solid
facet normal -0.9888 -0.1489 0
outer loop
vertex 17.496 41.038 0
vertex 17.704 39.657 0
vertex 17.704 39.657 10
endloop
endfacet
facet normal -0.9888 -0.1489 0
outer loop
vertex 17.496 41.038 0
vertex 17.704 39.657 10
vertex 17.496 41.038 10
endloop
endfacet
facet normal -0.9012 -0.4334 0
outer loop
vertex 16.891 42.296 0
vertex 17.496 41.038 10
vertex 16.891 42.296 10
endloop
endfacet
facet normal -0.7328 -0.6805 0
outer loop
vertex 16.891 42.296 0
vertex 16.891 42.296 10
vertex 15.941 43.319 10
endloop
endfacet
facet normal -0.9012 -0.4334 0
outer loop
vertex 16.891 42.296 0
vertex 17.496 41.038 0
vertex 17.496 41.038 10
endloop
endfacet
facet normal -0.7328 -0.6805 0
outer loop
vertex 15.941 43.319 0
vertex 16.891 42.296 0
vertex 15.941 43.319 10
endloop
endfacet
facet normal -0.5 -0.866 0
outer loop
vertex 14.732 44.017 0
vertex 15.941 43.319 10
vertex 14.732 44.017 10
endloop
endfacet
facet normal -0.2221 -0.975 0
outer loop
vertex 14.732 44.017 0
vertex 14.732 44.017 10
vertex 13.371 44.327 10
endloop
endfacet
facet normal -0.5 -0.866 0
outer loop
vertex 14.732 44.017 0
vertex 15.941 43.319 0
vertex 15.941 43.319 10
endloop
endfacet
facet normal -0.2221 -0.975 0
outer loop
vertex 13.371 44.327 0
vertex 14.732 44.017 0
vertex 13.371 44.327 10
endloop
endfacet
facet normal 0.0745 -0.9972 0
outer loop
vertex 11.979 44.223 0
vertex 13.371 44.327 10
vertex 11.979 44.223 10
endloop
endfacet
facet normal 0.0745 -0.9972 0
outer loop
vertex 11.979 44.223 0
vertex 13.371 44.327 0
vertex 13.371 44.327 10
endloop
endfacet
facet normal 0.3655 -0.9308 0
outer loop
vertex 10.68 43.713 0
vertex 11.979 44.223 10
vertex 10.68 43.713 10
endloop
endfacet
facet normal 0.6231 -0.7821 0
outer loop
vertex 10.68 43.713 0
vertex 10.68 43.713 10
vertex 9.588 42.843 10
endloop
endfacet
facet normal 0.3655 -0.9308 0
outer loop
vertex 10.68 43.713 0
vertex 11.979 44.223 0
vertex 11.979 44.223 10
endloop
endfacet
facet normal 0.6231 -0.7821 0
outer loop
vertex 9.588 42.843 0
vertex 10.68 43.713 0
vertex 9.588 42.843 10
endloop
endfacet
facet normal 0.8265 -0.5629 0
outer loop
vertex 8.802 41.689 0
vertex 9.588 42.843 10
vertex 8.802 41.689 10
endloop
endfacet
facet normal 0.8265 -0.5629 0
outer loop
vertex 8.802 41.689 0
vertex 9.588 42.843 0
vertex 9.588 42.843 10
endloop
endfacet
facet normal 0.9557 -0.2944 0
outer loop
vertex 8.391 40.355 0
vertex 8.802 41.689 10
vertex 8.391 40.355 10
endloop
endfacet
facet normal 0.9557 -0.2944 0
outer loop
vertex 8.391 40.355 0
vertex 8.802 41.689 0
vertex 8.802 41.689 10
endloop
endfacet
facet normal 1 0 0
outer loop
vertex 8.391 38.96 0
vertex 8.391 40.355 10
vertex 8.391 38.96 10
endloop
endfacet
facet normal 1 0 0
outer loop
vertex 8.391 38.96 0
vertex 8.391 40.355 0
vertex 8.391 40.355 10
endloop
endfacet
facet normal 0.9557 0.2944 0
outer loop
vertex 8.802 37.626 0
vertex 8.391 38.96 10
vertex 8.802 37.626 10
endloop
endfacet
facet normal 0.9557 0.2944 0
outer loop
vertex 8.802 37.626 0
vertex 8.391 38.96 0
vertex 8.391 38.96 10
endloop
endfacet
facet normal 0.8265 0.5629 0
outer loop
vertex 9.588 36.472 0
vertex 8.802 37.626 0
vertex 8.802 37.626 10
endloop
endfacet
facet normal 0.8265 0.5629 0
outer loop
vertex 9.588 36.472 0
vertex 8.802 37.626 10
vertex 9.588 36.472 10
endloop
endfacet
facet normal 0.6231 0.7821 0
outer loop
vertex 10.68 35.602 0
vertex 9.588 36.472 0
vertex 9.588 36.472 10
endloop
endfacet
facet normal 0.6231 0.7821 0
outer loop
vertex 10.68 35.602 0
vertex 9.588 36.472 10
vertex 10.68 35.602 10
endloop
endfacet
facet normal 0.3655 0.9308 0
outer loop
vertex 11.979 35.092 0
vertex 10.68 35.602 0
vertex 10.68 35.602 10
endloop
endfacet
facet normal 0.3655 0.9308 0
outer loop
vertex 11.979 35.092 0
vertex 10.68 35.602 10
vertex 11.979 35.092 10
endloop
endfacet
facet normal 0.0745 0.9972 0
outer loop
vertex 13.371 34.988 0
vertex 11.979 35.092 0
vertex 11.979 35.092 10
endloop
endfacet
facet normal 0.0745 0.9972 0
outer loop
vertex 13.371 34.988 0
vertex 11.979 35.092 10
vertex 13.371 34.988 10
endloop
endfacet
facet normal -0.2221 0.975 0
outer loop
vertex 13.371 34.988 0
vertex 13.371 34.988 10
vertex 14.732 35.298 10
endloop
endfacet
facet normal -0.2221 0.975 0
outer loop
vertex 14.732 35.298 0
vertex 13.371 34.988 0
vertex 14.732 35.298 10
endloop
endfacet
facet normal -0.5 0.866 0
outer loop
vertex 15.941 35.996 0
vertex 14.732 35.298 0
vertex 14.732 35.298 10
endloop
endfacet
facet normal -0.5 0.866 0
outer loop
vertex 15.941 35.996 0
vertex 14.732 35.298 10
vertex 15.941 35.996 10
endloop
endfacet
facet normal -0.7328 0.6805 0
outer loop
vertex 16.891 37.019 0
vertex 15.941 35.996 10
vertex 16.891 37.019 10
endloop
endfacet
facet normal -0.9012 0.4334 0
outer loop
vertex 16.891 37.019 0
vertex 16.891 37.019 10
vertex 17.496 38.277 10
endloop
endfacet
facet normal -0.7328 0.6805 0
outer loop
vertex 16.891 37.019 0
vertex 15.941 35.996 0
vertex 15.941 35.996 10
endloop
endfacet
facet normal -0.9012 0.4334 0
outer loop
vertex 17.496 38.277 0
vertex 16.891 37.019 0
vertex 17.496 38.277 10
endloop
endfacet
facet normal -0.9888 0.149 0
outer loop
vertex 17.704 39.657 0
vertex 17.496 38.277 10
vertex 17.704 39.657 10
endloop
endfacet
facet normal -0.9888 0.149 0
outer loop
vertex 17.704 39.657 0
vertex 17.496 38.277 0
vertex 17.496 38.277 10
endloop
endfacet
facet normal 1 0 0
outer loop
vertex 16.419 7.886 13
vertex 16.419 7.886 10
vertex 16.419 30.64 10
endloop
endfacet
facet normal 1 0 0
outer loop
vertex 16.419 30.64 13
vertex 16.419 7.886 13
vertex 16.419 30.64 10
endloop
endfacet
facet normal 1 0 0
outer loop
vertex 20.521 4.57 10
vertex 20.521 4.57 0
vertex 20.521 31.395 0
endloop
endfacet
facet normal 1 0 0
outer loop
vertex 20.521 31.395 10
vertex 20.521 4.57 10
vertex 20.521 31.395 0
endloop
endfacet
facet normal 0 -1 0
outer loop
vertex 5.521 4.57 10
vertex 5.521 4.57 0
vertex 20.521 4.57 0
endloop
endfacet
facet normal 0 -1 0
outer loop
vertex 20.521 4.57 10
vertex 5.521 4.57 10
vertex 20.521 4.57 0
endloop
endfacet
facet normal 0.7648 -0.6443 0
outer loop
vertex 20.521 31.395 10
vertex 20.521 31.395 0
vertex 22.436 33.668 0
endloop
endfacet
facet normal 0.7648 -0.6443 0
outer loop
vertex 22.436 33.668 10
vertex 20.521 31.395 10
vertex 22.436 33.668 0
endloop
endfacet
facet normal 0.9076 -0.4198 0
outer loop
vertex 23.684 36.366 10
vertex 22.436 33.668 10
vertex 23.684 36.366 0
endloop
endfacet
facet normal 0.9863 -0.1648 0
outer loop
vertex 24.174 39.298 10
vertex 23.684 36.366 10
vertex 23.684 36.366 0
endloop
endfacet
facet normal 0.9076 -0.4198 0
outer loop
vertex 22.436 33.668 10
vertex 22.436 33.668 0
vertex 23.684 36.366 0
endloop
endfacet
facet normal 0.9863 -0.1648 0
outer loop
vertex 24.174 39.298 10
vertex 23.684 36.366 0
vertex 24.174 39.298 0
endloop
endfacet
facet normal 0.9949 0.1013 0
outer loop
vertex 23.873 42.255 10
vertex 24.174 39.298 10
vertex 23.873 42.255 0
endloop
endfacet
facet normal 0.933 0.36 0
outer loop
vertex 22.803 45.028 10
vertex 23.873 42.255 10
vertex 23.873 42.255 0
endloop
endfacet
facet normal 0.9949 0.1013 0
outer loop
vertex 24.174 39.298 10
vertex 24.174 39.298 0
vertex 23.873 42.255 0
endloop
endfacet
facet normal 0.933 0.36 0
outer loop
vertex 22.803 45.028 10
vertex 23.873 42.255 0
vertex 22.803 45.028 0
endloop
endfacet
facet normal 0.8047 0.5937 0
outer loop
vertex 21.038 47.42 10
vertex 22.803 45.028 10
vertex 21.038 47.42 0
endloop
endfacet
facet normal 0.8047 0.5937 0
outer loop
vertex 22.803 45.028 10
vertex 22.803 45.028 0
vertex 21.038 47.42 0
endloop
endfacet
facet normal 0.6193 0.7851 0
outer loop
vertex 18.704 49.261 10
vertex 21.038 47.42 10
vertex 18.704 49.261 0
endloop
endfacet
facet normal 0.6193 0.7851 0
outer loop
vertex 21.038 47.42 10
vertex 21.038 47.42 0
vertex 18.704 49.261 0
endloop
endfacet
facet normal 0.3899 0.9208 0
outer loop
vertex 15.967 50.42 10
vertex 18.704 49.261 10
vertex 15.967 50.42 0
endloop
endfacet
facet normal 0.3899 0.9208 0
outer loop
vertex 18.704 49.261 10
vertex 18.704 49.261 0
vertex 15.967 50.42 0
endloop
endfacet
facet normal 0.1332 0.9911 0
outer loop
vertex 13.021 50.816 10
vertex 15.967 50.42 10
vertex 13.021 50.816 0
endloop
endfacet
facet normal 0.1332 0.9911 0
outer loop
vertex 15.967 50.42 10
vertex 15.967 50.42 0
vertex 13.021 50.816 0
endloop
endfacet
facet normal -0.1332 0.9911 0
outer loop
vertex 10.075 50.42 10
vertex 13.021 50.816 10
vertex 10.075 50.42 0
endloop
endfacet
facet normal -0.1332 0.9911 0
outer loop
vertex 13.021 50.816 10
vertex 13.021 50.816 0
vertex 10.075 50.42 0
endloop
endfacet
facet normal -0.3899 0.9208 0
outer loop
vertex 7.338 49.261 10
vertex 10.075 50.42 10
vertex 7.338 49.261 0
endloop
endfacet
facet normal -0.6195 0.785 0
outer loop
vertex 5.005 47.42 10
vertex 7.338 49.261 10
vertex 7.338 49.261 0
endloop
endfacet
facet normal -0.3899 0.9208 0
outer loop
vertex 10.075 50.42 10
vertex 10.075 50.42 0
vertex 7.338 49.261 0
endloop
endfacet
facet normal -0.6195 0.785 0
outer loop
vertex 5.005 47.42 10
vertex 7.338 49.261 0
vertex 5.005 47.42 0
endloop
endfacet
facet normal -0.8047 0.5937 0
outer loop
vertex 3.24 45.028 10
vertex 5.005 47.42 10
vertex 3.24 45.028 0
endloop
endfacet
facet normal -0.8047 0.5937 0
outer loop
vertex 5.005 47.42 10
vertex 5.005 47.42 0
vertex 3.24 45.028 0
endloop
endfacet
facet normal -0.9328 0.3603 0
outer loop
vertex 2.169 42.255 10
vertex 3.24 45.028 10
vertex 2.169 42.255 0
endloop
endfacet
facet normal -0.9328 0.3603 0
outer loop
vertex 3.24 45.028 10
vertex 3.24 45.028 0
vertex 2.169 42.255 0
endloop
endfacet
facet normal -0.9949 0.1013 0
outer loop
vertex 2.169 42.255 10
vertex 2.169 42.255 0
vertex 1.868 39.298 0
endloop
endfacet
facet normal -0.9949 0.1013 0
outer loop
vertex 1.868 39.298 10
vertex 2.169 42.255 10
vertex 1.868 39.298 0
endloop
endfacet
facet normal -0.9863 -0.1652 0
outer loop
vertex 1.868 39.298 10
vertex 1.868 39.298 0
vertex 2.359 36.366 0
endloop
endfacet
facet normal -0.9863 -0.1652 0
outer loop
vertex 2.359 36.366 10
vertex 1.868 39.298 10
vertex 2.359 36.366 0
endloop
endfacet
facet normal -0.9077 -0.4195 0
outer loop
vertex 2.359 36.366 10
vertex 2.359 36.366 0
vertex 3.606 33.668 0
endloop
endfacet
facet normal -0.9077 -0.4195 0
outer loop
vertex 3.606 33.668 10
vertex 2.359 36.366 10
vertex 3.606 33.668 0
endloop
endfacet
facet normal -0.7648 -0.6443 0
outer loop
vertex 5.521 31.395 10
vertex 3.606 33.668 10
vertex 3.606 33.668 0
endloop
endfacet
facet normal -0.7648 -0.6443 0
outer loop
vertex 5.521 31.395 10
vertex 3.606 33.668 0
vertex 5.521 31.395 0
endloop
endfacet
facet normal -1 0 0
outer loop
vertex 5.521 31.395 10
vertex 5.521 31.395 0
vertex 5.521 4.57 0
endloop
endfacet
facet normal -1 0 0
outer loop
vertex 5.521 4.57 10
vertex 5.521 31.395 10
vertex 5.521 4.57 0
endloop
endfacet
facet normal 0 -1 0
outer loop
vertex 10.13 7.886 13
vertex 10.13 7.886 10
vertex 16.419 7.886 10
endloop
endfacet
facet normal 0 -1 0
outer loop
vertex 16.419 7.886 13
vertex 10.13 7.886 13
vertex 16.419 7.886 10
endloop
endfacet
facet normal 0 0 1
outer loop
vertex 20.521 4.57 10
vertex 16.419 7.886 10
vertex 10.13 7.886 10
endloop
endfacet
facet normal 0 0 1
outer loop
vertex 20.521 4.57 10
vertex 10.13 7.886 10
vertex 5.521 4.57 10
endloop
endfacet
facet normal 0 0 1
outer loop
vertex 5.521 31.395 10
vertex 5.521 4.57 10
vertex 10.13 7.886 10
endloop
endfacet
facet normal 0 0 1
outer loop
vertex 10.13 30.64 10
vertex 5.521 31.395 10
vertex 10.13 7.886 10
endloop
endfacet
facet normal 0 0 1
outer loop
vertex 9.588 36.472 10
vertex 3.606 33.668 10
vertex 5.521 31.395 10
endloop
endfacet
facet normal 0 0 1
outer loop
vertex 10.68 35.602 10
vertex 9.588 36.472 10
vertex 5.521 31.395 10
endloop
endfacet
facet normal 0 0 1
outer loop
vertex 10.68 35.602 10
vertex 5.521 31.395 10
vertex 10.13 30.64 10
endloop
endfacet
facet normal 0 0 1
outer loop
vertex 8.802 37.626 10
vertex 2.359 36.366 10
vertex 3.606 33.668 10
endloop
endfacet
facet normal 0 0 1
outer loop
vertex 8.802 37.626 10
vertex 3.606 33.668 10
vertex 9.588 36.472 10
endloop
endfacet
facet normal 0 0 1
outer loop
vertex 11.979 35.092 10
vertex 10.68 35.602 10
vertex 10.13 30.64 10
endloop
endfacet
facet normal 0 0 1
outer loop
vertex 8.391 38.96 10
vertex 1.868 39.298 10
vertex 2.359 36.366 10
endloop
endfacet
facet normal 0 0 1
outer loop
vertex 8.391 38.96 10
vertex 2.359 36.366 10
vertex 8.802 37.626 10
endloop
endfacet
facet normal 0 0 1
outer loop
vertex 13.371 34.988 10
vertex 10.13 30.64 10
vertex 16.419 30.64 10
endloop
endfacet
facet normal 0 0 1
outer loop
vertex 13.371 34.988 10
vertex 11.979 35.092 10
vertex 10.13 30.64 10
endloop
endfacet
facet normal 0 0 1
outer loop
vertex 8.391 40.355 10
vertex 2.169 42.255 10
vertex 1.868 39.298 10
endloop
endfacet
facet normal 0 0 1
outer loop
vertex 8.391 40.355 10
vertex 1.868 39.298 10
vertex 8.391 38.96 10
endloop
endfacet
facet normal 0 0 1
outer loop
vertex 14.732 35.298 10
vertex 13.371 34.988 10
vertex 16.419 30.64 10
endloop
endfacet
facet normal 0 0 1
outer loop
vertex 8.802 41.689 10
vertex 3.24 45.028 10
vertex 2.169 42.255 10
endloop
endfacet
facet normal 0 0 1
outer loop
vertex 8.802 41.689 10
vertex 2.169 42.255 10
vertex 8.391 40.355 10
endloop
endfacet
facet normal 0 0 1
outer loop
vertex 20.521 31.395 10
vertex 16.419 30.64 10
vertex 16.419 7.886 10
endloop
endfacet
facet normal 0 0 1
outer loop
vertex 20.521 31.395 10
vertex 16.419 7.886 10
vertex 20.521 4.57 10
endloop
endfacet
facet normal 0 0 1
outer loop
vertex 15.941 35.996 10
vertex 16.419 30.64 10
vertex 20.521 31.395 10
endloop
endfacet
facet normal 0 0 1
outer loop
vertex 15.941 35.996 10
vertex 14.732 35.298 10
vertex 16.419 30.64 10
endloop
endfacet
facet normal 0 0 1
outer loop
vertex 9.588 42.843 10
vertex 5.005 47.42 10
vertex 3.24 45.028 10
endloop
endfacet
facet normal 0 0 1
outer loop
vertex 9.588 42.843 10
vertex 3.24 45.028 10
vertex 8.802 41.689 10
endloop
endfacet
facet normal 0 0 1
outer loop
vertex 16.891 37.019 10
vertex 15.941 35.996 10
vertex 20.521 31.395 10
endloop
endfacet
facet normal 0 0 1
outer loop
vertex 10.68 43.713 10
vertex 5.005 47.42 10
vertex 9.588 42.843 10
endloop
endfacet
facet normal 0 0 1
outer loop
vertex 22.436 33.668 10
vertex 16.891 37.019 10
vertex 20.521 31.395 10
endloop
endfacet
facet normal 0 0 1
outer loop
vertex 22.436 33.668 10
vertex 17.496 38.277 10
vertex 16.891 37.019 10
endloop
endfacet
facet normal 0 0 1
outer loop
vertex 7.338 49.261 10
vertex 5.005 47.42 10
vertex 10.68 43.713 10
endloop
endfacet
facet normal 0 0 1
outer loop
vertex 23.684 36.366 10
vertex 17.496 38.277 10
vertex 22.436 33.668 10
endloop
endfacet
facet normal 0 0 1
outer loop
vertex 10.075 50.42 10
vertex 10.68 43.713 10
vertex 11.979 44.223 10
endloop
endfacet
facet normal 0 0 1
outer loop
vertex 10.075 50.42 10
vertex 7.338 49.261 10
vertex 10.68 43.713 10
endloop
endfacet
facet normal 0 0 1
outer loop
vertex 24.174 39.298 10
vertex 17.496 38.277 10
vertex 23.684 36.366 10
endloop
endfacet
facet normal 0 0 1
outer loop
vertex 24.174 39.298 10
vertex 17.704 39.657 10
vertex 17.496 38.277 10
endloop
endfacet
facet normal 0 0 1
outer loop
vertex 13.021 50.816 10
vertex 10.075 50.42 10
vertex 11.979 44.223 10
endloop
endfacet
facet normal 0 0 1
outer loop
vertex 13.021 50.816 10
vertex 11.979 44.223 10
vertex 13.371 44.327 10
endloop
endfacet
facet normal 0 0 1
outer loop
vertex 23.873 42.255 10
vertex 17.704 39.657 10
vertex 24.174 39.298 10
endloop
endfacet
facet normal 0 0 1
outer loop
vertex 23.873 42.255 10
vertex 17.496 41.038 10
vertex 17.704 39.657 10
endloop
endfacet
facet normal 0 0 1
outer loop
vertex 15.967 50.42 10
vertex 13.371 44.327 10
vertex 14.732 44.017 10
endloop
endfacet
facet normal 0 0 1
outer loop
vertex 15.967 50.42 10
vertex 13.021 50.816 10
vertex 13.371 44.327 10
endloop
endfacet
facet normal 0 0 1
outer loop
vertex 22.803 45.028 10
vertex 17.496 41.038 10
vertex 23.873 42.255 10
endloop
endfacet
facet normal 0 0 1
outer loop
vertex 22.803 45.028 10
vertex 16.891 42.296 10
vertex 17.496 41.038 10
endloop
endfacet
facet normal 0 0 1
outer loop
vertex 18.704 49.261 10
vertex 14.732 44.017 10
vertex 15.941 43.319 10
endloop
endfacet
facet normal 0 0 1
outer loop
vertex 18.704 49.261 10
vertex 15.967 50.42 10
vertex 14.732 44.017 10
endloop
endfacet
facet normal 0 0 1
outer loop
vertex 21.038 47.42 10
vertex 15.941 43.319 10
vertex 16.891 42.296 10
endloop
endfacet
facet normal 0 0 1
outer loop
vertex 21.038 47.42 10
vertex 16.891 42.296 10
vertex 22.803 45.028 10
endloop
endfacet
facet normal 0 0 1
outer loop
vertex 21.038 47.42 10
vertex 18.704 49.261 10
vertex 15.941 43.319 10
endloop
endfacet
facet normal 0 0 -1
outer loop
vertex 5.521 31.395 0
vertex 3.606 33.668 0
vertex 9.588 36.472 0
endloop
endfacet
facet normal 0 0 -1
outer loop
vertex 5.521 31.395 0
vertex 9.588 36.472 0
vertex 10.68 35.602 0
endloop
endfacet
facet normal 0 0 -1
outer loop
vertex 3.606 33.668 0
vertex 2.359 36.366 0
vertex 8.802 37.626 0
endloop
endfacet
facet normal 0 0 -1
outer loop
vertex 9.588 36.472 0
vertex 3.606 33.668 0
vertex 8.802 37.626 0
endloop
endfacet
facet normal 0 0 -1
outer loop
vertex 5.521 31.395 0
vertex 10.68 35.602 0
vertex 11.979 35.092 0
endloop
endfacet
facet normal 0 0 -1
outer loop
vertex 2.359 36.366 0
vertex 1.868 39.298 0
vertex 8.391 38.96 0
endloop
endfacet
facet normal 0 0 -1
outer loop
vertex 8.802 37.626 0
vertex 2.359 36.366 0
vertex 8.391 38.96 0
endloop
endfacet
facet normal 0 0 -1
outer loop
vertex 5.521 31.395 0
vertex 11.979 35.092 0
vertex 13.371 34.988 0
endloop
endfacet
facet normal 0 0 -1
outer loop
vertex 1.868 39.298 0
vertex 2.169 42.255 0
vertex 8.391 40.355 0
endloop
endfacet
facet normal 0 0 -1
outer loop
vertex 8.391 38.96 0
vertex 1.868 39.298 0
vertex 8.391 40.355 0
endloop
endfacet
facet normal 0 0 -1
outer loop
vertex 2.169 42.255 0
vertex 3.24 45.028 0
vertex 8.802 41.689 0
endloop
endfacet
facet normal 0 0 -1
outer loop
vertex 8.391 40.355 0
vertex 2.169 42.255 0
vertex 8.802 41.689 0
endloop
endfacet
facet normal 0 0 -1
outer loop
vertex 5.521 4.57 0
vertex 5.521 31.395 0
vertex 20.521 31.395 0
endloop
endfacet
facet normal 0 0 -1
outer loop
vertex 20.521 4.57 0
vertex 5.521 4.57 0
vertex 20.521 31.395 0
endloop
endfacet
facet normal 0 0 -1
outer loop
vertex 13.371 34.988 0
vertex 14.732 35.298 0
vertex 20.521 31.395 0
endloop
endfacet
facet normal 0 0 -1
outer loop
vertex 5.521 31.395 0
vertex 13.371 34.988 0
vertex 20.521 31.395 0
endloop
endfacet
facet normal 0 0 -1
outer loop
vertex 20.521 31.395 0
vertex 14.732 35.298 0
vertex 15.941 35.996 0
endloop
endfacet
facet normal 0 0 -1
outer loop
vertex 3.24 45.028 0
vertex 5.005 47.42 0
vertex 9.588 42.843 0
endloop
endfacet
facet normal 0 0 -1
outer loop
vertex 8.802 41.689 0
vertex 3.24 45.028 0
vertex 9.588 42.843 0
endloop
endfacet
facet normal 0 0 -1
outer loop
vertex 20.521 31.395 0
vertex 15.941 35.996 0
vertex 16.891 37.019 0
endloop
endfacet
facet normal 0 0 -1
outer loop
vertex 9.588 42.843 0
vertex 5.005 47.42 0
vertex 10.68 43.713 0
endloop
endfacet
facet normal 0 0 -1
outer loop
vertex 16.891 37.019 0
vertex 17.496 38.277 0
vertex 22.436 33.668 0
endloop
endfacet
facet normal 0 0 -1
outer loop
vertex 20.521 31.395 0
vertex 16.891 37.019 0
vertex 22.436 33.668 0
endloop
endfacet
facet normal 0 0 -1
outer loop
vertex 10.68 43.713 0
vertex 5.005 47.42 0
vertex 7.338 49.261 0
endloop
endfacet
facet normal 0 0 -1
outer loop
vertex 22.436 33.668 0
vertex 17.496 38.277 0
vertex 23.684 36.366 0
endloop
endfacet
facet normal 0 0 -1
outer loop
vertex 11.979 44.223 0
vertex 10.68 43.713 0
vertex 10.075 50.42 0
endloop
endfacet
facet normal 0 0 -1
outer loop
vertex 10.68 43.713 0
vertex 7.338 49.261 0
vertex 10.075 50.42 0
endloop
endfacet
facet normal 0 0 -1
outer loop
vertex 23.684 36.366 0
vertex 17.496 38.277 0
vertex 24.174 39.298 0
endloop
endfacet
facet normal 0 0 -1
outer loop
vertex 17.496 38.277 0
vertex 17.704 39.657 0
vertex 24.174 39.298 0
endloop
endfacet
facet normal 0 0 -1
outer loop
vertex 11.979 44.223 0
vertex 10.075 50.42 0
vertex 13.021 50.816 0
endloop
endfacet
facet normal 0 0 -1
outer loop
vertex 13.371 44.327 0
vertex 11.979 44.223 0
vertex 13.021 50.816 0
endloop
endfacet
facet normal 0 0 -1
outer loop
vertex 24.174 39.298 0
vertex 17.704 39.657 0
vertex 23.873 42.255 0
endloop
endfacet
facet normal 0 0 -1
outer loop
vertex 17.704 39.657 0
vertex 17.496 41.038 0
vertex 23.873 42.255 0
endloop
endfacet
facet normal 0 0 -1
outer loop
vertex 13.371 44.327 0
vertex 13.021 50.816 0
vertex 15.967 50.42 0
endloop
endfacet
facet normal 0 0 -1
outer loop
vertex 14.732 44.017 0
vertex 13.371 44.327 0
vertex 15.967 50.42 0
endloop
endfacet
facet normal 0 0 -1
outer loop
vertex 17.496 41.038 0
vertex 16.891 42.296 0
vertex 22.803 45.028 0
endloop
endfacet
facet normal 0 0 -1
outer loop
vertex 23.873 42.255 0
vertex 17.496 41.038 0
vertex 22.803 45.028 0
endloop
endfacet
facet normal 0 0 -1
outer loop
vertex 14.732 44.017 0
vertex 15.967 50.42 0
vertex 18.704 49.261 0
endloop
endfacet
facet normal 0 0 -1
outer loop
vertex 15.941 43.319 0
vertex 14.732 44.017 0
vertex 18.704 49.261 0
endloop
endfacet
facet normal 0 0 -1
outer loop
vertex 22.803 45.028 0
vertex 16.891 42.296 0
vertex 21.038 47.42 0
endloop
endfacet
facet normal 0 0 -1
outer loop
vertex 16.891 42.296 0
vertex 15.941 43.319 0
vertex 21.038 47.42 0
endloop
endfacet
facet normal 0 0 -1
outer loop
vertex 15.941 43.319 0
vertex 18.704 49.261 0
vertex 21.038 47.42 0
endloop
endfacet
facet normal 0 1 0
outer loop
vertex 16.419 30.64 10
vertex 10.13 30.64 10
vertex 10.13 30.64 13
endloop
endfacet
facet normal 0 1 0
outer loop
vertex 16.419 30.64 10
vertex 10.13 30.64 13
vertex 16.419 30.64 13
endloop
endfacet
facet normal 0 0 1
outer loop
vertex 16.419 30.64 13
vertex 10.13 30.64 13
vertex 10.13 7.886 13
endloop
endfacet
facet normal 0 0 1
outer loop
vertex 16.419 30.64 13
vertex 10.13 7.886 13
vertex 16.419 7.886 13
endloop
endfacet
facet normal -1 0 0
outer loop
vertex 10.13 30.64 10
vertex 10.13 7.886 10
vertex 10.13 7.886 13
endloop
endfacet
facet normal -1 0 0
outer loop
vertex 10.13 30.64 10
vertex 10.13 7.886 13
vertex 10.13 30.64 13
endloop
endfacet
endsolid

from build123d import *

# Parameters (mm, degrees)
F0_W     = 6.288823
F0_H     = 22.754102
F0_R     = 4.68301
F1_DEPTH = 10
F2_DEPTH = 13


with BuildPart() as f1:
    # F0 (on Top) → F1 (new body)
    with BuildSketch(Plane.XY):
        with BuildLine():
            Line((20.521231, 4.569745), (20.521231, 31.395026))
            ThreePointArc((20.521231, 31.395026), (13.021231, 50.816255), (5.521231, 31.395026))
            Line((5.521231, 31.395026), (5.521231, 4.569745))
            Line((5.521231, 4.569745), (20.521231, 4.569745))
        make_face()
        with Locations((13.274627, 19.26272)):
            Rectangle(F0_W, F0_H, mode=Mode.SUBTRACT)
        with Locations((13.021231, 39.657483)):
            Circle(F0_R, mode=Mode.SUBTRACT)
    extrude(amount=F1_DEPTH)

    # F0 (on Top) → F2 (join)
    with BuildSketch(Plane.XY):
        with Locations((13.274627, 19.26272)):
            Rectangle(F0_W, F0_H)
    extrude(amount=F2_DEPTH)


solid = f1.part
